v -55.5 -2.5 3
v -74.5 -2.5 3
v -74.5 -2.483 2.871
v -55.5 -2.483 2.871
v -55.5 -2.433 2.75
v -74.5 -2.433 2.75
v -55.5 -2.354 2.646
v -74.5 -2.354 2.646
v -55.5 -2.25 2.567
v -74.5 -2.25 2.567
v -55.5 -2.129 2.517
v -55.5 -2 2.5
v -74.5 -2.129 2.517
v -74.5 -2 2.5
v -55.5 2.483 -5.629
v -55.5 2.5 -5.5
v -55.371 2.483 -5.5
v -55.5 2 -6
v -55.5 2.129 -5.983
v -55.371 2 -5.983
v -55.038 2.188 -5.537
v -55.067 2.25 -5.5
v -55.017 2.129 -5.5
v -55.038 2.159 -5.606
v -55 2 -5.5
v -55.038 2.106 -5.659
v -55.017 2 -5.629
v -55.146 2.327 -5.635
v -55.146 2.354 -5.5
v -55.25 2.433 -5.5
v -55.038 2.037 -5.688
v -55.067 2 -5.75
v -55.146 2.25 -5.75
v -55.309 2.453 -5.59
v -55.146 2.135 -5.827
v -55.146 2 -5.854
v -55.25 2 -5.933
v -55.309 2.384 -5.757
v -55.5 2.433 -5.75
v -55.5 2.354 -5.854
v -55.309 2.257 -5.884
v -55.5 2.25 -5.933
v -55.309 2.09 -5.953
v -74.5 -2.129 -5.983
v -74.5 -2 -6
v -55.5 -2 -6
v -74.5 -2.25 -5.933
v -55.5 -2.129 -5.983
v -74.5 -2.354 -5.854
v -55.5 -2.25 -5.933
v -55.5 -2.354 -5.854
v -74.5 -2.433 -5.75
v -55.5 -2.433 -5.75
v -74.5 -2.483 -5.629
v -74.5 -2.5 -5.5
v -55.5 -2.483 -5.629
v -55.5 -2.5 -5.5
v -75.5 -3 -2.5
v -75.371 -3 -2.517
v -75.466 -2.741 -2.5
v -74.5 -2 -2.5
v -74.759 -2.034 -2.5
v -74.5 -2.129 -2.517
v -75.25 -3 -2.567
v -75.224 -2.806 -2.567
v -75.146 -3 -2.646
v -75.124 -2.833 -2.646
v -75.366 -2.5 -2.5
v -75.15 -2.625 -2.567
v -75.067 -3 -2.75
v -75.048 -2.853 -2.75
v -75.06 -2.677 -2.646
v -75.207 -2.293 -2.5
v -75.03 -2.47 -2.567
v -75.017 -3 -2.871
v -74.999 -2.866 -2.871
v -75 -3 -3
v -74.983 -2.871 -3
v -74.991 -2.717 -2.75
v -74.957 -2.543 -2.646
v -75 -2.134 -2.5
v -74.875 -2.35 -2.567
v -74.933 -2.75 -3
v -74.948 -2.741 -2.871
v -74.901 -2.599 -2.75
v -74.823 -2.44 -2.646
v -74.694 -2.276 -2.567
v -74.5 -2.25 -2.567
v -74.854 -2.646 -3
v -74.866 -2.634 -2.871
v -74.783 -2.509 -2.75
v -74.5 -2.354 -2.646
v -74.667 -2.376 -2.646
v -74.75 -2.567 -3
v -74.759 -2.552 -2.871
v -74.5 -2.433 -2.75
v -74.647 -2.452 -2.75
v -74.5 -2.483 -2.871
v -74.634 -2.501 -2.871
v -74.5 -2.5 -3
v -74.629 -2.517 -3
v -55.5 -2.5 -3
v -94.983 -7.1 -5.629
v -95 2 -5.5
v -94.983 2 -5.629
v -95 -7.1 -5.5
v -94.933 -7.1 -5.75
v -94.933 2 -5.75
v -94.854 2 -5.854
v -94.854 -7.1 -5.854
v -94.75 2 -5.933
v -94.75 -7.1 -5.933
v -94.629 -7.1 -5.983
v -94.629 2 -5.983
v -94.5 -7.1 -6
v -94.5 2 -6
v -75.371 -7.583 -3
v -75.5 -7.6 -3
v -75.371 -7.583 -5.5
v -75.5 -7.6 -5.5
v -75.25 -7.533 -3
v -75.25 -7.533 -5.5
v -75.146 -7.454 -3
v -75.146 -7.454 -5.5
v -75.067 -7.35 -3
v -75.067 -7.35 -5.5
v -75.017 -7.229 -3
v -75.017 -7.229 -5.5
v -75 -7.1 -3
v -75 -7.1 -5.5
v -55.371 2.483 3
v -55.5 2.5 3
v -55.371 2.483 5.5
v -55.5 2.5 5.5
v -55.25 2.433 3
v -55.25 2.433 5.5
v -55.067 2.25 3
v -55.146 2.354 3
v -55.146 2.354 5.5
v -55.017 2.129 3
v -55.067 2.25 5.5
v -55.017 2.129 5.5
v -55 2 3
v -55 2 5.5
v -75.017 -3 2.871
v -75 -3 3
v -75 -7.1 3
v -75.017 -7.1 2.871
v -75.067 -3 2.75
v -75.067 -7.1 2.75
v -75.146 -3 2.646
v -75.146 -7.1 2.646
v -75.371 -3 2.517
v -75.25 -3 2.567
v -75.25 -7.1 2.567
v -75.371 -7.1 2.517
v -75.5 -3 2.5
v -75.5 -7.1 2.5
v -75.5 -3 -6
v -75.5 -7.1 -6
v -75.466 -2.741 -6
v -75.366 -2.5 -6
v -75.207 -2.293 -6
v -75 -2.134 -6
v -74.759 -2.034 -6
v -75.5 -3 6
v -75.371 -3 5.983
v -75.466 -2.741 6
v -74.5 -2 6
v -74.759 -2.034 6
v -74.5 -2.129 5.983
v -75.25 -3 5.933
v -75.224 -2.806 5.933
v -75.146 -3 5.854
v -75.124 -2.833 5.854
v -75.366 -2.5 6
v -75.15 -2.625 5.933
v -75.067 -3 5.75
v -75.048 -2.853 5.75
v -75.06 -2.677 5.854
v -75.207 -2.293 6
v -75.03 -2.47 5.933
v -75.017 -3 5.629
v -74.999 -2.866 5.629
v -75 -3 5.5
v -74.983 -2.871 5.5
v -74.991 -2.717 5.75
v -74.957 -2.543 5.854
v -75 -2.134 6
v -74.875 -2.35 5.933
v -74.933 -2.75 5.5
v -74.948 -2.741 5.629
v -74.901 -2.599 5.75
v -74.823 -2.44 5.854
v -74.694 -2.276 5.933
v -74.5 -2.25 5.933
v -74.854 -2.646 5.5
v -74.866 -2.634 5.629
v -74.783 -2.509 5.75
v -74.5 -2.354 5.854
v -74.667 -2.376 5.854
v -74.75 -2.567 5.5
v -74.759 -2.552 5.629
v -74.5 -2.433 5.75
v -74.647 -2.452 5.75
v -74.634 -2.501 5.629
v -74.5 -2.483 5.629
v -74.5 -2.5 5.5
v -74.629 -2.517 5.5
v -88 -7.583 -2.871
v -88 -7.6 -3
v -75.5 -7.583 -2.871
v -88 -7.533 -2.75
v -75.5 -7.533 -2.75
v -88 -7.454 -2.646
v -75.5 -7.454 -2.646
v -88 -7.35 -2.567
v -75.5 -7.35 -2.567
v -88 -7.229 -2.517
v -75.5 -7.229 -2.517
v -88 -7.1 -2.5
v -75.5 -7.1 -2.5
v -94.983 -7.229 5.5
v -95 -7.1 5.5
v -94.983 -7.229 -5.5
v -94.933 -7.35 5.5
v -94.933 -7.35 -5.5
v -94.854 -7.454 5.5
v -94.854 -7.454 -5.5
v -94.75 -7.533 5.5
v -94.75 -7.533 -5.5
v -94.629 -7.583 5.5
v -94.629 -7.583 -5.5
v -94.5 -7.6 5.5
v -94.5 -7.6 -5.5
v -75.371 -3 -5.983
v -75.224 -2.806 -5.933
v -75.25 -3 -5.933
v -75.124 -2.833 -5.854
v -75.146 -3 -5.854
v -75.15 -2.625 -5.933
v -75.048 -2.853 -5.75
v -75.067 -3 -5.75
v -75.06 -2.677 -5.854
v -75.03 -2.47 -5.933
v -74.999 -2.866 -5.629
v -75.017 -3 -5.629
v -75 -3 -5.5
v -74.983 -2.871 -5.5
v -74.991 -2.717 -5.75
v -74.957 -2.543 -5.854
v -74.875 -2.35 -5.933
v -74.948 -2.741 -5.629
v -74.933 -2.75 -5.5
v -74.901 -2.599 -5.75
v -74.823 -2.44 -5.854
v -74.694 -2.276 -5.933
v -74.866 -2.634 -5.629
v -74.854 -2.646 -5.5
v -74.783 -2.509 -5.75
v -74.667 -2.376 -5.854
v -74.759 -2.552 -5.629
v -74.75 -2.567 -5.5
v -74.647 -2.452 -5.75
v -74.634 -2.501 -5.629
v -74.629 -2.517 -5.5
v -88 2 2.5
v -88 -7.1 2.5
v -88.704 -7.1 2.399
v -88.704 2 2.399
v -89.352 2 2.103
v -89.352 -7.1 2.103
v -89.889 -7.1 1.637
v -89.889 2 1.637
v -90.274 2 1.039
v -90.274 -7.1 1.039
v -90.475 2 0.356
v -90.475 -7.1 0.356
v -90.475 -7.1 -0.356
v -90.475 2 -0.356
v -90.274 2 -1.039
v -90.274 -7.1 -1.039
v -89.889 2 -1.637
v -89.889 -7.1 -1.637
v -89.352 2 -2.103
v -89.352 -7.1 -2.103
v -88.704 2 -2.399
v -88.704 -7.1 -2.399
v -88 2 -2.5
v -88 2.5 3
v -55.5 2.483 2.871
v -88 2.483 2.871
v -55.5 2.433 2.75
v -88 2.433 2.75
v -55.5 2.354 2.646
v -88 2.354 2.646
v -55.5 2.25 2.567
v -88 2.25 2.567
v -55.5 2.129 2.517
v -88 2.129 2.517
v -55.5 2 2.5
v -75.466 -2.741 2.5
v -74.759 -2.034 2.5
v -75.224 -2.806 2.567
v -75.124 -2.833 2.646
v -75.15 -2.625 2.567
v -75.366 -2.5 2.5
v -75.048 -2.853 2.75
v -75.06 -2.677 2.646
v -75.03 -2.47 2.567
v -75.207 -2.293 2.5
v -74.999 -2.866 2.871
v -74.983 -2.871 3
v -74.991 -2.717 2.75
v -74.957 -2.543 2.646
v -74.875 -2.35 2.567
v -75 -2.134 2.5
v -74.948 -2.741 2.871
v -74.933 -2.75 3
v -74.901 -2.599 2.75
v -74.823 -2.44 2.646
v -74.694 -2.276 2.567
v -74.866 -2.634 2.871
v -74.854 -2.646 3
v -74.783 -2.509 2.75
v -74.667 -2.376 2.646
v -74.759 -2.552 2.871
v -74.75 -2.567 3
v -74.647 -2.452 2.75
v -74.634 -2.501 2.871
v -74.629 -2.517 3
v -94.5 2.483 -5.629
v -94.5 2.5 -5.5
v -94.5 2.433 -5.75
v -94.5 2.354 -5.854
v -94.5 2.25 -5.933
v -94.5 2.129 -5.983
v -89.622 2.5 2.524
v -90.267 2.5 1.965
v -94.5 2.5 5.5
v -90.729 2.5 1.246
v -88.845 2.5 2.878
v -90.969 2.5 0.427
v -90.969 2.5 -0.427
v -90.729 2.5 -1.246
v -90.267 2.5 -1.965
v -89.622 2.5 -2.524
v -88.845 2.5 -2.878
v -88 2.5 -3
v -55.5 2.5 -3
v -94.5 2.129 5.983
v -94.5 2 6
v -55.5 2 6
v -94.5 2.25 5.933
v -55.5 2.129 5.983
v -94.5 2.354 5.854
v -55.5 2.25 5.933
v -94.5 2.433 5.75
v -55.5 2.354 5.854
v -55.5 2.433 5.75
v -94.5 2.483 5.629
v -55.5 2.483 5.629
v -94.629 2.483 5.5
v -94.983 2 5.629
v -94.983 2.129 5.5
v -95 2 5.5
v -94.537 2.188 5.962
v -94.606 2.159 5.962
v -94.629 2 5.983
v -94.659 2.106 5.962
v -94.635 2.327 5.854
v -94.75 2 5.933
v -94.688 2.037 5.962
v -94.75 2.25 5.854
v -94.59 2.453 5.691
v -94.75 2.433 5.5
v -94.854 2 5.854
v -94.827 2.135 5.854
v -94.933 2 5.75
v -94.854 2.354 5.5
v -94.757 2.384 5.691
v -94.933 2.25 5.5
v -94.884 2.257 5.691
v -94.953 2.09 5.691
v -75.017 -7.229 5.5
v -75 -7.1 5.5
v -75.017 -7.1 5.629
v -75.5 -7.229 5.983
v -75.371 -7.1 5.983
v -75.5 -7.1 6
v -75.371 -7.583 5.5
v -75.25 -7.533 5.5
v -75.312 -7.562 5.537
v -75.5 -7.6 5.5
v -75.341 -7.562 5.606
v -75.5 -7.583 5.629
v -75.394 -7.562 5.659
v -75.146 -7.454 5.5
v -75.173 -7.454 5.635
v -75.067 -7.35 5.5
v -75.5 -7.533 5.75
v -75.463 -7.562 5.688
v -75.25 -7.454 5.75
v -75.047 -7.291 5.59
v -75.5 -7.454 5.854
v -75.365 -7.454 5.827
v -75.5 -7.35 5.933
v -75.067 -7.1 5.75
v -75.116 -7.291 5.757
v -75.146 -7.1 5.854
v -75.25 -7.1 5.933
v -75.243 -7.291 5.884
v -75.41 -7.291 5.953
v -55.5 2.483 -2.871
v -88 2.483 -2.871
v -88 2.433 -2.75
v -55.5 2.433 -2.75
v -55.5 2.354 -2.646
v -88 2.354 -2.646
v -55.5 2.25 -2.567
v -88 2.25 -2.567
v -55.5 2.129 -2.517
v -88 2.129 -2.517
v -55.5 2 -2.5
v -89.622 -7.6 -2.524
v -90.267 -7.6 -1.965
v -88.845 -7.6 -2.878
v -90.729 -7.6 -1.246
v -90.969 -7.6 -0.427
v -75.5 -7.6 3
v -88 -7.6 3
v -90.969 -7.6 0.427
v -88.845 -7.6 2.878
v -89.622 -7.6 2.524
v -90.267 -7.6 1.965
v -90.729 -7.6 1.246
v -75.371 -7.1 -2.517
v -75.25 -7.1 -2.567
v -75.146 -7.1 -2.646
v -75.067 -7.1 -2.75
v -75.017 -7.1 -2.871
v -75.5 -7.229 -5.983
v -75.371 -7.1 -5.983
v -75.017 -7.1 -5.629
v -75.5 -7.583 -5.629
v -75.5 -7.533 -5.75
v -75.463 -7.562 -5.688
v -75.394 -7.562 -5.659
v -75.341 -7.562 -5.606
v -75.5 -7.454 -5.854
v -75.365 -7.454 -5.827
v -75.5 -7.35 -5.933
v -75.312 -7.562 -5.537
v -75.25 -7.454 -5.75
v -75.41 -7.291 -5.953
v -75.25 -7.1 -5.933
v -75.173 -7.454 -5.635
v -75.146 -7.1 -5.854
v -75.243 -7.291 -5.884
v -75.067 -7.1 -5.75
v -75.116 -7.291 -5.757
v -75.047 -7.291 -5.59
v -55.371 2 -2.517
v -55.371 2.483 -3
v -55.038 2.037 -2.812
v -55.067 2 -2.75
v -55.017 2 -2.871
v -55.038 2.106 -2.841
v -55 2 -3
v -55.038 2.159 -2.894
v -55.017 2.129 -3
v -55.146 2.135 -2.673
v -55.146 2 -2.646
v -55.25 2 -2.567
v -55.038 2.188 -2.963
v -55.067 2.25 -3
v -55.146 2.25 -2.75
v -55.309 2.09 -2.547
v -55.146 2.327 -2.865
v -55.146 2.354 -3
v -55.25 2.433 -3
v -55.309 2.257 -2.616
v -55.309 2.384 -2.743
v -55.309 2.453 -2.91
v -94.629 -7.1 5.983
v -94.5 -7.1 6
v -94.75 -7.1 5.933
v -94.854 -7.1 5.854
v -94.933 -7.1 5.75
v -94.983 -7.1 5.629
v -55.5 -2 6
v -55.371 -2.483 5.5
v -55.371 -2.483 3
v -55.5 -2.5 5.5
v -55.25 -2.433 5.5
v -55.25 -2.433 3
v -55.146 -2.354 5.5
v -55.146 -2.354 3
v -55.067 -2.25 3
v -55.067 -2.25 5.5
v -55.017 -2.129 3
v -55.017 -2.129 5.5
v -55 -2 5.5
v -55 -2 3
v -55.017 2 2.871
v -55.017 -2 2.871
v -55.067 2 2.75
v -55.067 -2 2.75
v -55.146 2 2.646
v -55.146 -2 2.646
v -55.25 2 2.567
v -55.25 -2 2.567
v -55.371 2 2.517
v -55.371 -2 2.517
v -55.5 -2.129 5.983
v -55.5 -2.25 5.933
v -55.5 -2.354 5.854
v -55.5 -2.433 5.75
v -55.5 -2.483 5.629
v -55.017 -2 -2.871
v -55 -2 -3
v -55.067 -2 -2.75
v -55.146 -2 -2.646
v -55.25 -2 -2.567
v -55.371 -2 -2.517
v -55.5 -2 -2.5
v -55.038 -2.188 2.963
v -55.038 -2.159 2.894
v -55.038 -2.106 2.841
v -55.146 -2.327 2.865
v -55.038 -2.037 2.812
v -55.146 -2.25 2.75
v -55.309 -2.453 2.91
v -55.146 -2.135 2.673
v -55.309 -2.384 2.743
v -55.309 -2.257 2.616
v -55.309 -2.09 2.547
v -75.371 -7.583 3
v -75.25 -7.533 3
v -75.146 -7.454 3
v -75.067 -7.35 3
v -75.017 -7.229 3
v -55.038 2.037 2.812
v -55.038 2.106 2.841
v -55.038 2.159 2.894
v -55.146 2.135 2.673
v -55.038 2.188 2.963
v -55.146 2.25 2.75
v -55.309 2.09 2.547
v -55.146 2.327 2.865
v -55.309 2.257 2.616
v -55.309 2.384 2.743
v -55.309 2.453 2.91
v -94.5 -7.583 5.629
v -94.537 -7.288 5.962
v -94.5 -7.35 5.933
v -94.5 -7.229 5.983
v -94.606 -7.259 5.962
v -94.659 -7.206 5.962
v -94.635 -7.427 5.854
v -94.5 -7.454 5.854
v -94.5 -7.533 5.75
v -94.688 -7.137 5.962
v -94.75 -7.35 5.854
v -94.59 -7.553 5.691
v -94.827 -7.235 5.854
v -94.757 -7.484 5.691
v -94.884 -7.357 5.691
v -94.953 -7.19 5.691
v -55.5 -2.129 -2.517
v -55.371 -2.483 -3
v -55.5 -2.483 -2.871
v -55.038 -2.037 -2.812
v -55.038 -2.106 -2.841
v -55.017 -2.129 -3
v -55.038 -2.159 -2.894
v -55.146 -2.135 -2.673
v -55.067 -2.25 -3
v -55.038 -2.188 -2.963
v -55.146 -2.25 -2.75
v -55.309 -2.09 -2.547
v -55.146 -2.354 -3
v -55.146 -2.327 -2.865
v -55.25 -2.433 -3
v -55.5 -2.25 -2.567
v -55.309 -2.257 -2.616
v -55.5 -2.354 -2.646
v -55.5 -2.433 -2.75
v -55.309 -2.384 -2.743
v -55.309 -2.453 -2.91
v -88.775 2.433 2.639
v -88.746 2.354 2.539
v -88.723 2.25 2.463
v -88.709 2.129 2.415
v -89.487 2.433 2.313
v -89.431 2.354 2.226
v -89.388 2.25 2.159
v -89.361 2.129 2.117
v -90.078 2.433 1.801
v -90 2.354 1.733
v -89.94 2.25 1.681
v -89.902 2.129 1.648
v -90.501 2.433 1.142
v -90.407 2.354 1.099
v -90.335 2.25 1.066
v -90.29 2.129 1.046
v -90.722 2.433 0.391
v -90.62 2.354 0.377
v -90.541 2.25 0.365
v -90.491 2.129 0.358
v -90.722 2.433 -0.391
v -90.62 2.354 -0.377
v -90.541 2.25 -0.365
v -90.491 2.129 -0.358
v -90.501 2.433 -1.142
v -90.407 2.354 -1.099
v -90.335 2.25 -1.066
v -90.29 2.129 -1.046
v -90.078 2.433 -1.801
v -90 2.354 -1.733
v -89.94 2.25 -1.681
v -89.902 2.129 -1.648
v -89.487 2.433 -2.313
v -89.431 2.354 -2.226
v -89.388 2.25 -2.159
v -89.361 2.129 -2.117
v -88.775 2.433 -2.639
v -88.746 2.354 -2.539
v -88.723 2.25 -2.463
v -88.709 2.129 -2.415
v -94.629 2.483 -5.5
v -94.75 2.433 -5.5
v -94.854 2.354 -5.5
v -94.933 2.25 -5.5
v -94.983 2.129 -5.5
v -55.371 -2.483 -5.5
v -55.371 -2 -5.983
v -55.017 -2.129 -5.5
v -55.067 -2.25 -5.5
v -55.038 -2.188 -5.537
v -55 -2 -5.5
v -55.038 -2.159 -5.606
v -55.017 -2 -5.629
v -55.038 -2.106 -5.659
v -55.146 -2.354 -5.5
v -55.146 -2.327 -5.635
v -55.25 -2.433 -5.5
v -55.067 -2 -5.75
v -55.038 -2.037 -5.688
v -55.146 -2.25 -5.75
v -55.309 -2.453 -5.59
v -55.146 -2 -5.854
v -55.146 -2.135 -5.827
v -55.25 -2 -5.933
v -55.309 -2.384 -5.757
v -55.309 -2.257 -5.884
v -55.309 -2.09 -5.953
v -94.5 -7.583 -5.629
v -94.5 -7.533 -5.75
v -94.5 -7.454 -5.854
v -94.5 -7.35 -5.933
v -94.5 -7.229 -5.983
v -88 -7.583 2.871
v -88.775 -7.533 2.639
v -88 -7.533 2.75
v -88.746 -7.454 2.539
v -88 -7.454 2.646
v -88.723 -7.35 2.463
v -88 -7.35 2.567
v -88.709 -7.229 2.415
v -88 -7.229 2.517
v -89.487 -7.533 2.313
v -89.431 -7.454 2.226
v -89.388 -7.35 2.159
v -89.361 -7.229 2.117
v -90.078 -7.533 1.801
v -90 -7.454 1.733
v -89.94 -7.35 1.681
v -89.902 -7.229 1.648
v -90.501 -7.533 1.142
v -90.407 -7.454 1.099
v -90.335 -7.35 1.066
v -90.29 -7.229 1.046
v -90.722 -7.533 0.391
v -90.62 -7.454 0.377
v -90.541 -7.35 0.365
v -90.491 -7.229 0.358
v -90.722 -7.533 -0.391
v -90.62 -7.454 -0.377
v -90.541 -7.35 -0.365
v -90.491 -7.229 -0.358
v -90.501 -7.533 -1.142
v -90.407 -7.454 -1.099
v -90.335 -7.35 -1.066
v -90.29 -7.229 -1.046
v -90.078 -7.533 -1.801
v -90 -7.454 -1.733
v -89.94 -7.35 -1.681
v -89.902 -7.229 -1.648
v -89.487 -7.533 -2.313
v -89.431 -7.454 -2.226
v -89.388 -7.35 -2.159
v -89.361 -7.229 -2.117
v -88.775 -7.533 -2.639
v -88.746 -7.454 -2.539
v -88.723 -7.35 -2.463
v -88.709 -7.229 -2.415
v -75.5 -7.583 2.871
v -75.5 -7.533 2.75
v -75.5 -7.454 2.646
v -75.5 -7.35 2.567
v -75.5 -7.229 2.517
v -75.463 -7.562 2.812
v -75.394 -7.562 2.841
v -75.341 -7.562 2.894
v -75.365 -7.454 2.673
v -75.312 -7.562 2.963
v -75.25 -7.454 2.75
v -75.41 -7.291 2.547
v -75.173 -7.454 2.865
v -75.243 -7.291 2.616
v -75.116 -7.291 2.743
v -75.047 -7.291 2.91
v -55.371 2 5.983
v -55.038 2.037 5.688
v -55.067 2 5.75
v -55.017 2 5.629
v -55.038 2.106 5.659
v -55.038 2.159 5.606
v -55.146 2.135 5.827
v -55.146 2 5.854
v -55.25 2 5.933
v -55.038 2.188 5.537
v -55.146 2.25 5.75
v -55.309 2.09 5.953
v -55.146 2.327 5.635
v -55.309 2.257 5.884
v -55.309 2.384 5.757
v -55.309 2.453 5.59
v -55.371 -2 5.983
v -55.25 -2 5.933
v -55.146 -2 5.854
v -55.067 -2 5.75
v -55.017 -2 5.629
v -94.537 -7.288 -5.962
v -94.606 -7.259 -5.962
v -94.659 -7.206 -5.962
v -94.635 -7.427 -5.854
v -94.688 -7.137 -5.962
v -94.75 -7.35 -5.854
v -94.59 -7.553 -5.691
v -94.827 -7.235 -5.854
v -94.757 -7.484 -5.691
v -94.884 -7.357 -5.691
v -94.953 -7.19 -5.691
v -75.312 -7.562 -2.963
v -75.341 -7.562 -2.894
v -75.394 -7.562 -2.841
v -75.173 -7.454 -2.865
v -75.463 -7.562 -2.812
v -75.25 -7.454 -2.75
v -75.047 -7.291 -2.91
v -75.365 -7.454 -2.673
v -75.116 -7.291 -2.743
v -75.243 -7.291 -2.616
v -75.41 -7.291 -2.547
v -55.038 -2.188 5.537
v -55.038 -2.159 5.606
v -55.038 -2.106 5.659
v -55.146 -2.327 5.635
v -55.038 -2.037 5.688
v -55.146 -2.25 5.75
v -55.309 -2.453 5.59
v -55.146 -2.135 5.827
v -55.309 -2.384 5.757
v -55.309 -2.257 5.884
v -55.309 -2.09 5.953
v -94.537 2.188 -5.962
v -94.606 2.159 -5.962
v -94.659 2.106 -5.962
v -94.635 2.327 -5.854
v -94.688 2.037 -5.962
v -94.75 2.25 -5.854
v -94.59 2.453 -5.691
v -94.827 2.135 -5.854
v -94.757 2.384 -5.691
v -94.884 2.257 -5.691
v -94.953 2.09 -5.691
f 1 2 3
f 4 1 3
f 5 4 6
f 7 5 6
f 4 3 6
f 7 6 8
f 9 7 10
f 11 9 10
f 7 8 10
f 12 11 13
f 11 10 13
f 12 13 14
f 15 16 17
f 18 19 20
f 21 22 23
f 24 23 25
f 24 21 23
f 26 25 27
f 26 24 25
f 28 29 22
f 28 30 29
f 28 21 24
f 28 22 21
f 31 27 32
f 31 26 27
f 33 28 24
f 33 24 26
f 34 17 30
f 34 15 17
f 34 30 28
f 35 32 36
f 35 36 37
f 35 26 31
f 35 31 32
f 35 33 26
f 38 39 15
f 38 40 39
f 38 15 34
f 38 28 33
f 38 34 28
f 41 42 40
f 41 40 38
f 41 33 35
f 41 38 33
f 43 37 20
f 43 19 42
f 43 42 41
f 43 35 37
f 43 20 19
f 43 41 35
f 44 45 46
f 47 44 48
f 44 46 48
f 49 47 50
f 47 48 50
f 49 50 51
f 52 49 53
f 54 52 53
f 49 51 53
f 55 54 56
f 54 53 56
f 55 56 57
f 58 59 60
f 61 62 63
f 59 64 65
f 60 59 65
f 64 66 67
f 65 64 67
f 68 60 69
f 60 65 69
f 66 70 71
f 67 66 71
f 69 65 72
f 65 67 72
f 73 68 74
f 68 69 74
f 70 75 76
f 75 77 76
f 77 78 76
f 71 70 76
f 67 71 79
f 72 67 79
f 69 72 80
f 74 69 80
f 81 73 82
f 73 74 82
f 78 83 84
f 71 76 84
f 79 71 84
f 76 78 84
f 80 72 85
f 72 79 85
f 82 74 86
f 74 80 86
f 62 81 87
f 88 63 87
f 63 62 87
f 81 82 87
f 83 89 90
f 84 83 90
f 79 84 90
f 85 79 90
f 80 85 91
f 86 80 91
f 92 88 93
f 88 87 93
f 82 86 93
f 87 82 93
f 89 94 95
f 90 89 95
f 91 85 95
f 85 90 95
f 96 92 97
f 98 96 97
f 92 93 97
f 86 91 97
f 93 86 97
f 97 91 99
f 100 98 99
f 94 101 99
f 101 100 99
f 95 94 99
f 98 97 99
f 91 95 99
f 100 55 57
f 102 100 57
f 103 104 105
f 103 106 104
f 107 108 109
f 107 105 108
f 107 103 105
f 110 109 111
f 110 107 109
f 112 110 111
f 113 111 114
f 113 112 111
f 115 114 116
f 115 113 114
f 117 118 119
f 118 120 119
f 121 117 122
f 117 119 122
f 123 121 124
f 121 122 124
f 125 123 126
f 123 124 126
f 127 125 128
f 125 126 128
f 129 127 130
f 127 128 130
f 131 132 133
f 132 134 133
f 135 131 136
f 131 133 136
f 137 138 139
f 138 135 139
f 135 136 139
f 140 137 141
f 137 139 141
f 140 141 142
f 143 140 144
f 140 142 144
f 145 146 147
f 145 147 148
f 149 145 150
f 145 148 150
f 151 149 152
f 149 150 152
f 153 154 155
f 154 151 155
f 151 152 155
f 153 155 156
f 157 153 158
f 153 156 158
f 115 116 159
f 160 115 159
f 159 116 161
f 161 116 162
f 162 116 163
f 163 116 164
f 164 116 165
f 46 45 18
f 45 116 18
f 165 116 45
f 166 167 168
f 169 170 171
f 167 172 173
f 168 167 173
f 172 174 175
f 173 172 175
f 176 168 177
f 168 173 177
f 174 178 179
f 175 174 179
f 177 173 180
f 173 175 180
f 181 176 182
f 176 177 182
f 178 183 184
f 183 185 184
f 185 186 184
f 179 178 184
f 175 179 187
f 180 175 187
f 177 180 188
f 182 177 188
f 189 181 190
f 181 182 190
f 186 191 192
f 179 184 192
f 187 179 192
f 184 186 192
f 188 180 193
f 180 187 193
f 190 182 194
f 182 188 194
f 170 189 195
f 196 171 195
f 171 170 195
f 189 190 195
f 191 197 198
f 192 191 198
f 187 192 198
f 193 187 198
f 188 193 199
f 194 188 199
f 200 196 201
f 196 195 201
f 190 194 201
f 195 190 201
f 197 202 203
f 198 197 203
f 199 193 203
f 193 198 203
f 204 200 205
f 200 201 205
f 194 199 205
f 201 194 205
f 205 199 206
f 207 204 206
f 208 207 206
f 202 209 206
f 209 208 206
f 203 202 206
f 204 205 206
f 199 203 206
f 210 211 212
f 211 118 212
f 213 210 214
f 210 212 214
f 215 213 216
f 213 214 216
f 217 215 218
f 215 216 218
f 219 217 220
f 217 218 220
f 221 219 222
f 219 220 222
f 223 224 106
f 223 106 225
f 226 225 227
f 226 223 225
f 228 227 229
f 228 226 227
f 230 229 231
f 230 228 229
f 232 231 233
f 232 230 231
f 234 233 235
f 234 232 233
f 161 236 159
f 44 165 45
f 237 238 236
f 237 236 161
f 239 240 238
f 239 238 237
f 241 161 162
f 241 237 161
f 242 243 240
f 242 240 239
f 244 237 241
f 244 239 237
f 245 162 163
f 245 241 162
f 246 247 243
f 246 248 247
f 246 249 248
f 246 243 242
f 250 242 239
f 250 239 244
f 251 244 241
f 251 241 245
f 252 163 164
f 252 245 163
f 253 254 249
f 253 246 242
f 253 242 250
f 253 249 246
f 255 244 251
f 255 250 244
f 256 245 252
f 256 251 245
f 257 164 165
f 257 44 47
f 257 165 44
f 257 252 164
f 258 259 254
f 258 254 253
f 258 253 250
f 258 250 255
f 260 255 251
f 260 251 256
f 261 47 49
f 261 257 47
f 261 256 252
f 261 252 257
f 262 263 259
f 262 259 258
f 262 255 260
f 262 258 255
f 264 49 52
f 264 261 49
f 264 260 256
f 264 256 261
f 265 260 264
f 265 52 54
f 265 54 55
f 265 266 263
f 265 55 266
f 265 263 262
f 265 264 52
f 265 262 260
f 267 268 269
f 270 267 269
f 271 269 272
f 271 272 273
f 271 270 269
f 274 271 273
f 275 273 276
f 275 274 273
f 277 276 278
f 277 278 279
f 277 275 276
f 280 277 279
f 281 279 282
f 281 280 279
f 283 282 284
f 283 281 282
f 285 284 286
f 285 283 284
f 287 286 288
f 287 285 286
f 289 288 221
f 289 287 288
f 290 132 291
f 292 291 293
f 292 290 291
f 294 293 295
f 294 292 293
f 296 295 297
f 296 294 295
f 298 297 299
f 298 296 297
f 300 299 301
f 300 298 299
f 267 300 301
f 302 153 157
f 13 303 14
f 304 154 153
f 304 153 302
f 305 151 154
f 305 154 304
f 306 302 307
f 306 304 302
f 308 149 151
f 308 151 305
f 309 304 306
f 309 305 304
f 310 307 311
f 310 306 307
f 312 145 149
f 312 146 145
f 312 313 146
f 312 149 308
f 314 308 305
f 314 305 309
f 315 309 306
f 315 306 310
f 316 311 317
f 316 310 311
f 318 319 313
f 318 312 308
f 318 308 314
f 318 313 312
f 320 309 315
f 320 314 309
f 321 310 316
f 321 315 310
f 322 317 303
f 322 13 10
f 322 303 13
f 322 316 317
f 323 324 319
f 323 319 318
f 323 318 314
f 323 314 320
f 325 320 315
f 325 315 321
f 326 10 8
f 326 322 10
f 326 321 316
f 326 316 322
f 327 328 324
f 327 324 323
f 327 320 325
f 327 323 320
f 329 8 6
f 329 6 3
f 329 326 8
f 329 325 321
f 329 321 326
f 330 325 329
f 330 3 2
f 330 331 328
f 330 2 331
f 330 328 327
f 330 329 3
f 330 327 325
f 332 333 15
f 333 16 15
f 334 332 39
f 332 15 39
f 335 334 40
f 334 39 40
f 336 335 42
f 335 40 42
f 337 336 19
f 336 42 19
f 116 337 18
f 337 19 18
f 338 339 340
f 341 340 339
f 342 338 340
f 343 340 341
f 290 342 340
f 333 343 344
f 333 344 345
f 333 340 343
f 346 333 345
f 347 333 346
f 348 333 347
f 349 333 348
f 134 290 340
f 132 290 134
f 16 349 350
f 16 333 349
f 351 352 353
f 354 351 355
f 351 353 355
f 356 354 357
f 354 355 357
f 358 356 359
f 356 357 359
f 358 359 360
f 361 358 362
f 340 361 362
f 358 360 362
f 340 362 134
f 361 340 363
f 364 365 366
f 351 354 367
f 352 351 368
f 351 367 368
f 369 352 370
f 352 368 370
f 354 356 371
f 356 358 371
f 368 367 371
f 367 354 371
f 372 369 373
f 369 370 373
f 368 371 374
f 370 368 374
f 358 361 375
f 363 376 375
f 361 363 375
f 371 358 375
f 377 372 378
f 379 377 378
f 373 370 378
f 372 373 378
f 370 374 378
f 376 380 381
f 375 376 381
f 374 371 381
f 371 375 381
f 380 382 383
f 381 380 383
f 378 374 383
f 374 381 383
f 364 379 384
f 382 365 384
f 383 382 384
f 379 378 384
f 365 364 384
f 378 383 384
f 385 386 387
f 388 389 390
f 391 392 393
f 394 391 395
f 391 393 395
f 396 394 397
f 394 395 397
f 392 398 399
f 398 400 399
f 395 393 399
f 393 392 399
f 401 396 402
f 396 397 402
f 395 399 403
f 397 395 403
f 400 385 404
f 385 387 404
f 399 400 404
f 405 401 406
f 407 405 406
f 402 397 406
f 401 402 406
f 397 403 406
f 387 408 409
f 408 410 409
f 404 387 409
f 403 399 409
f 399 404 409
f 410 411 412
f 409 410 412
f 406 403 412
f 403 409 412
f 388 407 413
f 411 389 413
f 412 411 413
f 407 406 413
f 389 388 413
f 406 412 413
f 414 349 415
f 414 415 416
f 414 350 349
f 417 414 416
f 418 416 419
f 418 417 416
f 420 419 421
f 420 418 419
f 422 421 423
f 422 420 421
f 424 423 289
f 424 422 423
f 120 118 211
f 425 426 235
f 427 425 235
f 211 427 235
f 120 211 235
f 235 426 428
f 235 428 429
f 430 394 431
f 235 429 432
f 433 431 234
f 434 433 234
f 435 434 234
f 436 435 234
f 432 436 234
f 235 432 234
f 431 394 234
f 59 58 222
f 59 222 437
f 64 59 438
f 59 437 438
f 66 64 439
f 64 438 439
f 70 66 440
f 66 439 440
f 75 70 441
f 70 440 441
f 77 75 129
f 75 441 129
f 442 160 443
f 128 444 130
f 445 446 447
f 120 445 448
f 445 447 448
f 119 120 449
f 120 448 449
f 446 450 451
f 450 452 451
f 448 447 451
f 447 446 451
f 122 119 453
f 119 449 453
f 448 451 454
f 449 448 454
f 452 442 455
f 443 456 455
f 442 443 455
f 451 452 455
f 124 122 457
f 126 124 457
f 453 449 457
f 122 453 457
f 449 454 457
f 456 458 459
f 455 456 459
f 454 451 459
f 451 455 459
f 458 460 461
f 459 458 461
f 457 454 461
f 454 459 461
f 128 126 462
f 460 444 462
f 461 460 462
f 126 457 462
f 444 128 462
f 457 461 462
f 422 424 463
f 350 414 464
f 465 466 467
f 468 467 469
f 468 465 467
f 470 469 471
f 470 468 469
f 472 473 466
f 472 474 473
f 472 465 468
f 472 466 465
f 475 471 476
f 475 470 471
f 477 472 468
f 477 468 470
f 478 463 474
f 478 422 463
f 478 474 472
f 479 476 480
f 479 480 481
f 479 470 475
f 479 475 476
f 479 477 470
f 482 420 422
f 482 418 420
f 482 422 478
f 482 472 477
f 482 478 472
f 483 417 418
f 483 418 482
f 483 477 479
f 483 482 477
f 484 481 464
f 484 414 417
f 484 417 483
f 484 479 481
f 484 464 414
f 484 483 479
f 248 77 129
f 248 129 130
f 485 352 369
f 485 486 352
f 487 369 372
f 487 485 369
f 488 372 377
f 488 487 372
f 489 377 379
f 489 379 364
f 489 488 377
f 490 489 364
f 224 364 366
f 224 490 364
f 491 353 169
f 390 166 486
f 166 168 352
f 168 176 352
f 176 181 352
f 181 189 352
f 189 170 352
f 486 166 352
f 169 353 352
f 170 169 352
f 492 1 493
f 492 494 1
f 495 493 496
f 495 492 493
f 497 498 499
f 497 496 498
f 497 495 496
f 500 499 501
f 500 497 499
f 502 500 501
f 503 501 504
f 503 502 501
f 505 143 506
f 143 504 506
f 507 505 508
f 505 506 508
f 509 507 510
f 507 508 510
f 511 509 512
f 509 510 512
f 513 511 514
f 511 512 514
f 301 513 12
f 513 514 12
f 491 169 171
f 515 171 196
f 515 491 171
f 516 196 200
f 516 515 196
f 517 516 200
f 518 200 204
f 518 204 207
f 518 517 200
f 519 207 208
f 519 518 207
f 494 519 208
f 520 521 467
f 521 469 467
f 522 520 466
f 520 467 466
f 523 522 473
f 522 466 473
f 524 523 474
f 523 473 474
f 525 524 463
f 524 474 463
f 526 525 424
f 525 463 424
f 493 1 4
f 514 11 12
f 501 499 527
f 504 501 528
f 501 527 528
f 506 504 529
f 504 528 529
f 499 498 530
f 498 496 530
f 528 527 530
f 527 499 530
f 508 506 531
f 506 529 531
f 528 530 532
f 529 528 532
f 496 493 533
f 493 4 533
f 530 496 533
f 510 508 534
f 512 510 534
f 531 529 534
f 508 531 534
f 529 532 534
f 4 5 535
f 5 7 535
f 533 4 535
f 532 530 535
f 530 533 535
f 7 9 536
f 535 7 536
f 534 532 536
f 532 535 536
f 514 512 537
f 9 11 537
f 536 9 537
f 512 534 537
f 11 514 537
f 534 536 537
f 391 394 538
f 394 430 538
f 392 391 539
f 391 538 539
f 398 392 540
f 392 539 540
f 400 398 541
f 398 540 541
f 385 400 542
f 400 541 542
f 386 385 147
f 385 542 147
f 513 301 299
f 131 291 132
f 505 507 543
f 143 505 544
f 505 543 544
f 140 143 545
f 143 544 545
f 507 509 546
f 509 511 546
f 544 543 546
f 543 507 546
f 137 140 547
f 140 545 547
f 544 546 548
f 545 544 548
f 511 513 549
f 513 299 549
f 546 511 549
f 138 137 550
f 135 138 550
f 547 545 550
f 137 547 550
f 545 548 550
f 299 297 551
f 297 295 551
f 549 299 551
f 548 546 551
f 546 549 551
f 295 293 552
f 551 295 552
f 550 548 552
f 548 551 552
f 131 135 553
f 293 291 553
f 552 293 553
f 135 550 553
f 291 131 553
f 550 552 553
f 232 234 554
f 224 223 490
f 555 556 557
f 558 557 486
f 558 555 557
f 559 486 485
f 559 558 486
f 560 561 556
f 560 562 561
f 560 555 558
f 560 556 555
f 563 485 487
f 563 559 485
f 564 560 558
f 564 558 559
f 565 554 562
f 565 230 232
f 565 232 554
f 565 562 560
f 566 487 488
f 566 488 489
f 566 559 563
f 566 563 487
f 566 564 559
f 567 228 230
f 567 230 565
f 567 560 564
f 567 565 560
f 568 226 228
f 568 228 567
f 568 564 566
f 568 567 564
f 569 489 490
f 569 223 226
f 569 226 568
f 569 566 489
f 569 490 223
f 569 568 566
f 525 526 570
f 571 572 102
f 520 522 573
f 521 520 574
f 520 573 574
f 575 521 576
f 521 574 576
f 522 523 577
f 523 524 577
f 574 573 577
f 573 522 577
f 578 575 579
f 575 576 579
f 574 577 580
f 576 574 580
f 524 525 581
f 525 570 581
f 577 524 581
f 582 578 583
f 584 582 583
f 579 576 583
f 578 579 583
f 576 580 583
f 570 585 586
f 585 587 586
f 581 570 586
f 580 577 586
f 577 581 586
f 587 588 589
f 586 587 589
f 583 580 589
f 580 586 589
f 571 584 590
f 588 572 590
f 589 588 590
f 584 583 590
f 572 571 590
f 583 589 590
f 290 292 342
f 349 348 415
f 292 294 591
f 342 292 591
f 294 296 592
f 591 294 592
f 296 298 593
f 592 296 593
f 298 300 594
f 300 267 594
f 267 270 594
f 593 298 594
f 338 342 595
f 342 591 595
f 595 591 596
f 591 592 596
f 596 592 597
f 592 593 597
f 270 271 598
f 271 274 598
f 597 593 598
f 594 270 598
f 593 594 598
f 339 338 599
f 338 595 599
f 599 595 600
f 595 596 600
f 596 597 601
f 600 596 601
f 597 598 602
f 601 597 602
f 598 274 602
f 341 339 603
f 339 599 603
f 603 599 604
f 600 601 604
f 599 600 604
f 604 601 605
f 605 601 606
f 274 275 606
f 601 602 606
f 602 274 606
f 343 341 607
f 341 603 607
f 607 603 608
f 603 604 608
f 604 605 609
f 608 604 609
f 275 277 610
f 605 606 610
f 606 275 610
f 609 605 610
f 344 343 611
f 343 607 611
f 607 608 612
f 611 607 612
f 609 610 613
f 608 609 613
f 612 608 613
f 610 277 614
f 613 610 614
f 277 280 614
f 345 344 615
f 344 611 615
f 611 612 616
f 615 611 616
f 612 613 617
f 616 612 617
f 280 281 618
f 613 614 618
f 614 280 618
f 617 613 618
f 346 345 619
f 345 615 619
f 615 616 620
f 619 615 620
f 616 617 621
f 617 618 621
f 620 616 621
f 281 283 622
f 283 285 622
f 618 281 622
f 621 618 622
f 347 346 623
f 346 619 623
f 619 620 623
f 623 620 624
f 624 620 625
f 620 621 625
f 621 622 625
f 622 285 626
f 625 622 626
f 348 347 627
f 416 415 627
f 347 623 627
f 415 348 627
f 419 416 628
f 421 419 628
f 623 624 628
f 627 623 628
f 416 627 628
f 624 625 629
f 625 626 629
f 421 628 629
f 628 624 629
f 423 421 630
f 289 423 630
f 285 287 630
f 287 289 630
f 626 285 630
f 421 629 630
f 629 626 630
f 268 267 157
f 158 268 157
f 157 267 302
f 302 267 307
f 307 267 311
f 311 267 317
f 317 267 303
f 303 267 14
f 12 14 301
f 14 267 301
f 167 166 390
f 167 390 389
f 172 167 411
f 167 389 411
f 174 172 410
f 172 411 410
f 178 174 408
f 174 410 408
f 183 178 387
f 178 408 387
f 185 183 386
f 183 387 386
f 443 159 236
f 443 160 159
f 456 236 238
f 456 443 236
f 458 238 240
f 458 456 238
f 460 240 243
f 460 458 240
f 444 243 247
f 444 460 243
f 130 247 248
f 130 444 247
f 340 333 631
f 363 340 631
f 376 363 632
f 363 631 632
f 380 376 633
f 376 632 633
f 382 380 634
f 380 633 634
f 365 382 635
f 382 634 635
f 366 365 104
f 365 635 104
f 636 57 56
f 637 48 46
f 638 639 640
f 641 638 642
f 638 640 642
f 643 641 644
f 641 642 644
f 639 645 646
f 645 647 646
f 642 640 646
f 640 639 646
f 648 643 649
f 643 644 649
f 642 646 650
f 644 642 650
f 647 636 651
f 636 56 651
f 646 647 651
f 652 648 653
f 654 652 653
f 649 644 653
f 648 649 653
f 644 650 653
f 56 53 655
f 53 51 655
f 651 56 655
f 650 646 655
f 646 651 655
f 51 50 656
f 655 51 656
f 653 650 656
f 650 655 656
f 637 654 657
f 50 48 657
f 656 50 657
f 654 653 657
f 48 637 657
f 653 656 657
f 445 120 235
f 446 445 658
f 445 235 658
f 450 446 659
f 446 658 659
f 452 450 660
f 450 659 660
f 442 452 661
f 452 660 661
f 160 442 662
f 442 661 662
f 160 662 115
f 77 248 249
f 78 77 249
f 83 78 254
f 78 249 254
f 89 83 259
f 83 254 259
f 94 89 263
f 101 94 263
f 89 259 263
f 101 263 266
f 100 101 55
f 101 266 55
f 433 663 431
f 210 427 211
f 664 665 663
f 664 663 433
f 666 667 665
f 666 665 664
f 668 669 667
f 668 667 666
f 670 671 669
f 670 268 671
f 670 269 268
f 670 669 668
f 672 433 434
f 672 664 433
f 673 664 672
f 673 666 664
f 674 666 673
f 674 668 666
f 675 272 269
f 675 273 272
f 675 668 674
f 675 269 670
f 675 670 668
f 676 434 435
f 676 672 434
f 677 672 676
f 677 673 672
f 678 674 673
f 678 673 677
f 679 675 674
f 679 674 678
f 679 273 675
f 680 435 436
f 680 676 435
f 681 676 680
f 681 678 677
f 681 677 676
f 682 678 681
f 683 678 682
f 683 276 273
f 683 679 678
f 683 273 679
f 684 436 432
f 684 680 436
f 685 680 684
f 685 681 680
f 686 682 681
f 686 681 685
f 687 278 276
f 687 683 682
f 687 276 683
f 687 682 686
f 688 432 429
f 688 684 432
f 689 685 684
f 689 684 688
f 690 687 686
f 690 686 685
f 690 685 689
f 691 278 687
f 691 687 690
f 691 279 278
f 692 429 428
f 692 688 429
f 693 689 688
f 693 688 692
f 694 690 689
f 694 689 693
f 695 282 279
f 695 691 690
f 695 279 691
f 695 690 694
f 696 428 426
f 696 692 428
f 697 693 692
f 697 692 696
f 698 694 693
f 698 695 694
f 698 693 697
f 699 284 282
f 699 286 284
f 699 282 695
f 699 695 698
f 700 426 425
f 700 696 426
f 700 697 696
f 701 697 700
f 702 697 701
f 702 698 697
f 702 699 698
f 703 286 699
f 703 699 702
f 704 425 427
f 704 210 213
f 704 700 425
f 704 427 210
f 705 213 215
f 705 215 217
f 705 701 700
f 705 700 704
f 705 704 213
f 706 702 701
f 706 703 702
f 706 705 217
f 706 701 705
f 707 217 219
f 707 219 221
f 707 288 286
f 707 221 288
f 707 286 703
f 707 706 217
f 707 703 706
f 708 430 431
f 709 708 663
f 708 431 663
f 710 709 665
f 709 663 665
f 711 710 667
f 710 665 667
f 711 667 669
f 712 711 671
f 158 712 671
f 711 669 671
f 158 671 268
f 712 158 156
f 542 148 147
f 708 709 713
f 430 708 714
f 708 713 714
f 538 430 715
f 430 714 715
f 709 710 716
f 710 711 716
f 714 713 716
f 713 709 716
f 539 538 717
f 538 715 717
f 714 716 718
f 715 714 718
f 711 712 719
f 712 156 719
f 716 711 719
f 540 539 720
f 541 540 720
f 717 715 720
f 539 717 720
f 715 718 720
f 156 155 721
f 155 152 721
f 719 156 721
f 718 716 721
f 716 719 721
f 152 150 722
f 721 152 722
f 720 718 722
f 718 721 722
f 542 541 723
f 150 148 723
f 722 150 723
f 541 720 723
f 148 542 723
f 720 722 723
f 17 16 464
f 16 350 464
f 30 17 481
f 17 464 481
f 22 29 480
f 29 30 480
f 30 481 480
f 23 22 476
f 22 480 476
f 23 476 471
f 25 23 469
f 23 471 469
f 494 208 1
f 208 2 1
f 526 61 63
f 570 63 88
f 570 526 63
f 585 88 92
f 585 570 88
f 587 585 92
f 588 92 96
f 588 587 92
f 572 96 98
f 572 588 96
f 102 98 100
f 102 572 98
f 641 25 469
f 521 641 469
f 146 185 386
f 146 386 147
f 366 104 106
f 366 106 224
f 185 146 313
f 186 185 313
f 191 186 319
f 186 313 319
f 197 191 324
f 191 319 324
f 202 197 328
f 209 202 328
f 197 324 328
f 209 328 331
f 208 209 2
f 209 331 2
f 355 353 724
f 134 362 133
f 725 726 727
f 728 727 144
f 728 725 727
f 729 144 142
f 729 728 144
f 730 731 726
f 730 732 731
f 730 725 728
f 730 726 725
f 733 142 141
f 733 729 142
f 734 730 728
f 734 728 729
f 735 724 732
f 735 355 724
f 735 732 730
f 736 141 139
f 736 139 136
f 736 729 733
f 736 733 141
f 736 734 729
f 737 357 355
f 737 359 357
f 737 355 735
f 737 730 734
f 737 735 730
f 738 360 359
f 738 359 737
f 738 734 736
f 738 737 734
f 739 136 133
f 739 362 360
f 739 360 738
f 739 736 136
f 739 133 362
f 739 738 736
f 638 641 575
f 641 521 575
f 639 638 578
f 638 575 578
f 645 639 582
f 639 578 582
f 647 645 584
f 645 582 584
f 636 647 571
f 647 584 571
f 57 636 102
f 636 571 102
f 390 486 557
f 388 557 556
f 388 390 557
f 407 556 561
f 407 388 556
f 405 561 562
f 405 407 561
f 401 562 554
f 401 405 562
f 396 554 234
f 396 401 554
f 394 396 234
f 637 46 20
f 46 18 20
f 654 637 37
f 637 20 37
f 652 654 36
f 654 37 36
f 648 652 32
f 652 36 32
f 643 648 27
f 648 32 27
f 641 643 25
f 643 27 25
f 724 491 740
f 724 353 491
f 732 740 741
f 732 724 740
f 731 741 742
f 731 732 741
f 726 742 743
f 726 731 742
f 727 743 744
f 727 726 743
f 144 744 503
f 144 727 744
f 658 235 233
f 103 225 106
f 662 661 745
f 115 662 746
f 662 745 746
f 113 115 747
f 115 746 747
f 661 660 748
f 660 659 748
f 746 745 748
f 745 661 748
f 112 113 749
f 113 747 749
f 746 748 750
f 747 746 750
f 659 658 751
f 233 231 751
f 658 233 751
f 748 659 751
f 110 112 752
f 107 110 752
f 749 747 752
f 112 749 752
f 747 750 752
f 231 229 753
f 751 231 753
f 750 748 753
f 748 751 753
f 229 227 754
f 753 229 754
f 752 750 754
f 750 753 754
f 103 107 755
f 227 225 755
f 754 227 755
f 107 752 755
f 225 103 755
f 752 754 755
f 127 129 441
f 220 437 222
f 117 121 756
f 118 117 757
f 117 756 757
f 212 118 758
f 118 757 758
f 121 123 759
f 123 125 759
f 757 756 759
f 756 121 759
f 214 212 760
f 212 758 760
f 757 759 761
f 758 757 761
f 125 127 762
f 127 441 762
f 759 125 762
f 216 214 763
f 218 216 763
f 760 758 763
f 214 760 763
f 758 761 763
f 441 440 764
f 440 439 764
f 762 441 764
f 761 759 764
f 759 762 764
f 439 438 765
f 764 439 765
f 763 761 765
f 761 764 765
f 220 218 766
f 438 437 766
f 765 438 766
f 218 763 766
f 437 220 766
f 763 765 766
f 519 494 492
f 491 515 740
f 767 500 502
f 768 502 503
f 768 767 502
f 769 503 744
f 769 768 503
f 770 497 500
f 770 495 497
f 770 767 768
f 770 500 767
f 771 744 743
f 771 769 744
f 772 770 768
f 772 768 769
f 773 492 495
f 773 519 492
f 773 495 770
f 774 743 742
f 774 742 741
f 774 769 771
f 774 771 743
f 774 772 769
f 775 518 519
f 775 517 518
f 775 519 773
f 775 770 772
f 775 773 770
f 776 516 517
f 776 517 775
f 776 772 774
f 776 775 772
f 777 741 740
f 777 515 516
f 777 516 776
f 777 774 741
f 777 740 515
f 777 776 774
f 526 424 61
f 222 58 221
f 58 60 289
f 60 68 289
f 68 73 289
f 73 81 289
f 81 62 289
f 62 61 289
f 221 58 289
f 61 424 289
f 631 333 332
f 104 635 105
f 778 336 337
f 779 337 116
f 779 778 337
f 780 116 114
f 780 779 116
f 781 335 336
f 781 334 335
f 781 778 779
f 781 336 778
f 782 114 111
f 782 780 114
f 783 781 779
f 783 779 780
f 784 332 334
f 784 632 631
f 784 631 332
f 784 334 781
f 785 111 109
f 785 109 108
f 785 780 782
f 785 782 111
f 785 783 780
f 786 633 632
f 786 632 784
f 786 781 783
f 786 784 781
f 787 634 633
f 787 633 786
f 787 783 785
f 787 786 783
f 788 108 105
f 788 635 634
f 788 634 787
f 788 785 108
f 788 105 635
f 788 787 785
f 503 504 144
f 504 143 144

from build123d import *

# Parameters (mm, degrees)
ESQUISSE1_W             = 190
ESQUISSE1_H             = 12
BOSS_EXTRU_1_DEPTH      = 2.5
BOSS_EXTRU_3_DEPTH      = 5.1
ENL_V_START             = -40
ESQUISSE5_W             = 12
ESQUISSE5_H             = 10.1
ENL_V_MAT_EXTRU_1_DEPTH = 151
CONG_1_R                = 0.5


with BuildPart() as part:
    # Esquisse1 → Boss.-Extru.1 (new body, symmetric)
    with BuildSketch(Plane(origin=(0, 0, 0), x_dir=(1, 0, 0), z_dir=(0, 1, 0))):
        Rectangle(ESQUISSE1_W, ESQUISSE1_H)
        with BuildLine():
            Line((-88, 2.5), (88, 2.5))
            ThreePointArc((88, 2.5), (90.5, 0), (88, -2.5))
            Line((88, -2.5), (-88, -2.5))
            ThreePointArc((-88, -2.5), (-90.5, 0), (-88, 2.5))
        make_face(mode=Mode.SUBTRACT)
    extrude(amount=BOSS_EXTRU_1_DEPTH, both=True)

    # Esquisse4 → Boss.-Extru.3 (add)
    with BuildSketch(Plane.XZ.offset(2.5)):
        with BuildLine():
            Line((-95, 6), (-75, 6))
            Line((-75, 6), (-75, 2.5))
            Line((-75, 2.5), (-88, 2.5))
            ThreePointArc((-88, 2.5), (-90.5, 0), (-88, -2.5))
            Line((-88, -2.5), (-75, -2.5))
            Line((-75, -2.5), (-75, -6))
            Line((-75, -6), (-95, -6))
            Line((-95, -6), (-95, 6))
        make_face()
    boss_extru_3 = extrude(amount=BOSS_EXTRU_3_DEPTH)

    # Symétrie2: Boss.-Extru.3 across plane
    add(boss_extru_3.mirror(Plane(origin=(0, 0, 0), x_dir=(0, 0, 1), z_dir=(1, 0, 0))))

    # Esquisse5 → Enlèv. mat.-Extru.1 (cut, through all)
    with BuildSketch(Plane.ZY.offset(95).offset(ENL_V_START)):
        with Locations((0, -2.55)):
            Rectangle(ESQUISSE5_W, ESQUISSE5_H)
    extrude(amount=-ENL_V_MAT_EXTRU_1_DEPTH, mode=Mode.SUBTRACT)

    # Congé1
    cong_1_edges = [part.edges().sort_by_distance(p)[0] for p in [
        (-95, 2.5, 0),
        (-90.5, 2.5, 0),
        (-75, 2.5, 6),
        (-71.5, 2.5, 2.5),
        (-65, -2.5, 6),
        (-65, -2.5, 2.5),
        (-75, -2.5, -4.25),
        (-75, -5.05, -6),
        (-75, -5.05, -2.5),
        (-75, -2.5, 4.25),
        (-75, -5.05, 2.5),
        (-75, -5.05, 6),
        (-95, -7.6, 0),
        (-85, -7.6, -6),
        (-75, -7.6, -4.25),
        (-81.5, -7.6, -2.5),
        (-90.5, -7.6, 0),
        (-81.5, -7.6, 2.5),
        (-75, -7.6, 4.25),
        (-85, -7.6, 6),
        (-65, -2.5, -2.5),
        (-71.5, 2.5, -2.5),
        (-55, 0, -2.5),
        (-65, -2.5, -6),
        (-95, -2.55, 6),
        (-75, 2.5, -6),
        (-95, -2.55, -6),
        (-55, -2.5, 4.25),
        (-55, 0, 2.5),
        (-55, -2.5, -4.25),
        (-55, 0, 6),
        (-55, 2.5, 4.25),
        (-55, 2.5, -4.25),
        (-55, 0, -6),
    ]]
    fillet(cong_1_edges, radius=CONG_1_R)


solid = part.part
